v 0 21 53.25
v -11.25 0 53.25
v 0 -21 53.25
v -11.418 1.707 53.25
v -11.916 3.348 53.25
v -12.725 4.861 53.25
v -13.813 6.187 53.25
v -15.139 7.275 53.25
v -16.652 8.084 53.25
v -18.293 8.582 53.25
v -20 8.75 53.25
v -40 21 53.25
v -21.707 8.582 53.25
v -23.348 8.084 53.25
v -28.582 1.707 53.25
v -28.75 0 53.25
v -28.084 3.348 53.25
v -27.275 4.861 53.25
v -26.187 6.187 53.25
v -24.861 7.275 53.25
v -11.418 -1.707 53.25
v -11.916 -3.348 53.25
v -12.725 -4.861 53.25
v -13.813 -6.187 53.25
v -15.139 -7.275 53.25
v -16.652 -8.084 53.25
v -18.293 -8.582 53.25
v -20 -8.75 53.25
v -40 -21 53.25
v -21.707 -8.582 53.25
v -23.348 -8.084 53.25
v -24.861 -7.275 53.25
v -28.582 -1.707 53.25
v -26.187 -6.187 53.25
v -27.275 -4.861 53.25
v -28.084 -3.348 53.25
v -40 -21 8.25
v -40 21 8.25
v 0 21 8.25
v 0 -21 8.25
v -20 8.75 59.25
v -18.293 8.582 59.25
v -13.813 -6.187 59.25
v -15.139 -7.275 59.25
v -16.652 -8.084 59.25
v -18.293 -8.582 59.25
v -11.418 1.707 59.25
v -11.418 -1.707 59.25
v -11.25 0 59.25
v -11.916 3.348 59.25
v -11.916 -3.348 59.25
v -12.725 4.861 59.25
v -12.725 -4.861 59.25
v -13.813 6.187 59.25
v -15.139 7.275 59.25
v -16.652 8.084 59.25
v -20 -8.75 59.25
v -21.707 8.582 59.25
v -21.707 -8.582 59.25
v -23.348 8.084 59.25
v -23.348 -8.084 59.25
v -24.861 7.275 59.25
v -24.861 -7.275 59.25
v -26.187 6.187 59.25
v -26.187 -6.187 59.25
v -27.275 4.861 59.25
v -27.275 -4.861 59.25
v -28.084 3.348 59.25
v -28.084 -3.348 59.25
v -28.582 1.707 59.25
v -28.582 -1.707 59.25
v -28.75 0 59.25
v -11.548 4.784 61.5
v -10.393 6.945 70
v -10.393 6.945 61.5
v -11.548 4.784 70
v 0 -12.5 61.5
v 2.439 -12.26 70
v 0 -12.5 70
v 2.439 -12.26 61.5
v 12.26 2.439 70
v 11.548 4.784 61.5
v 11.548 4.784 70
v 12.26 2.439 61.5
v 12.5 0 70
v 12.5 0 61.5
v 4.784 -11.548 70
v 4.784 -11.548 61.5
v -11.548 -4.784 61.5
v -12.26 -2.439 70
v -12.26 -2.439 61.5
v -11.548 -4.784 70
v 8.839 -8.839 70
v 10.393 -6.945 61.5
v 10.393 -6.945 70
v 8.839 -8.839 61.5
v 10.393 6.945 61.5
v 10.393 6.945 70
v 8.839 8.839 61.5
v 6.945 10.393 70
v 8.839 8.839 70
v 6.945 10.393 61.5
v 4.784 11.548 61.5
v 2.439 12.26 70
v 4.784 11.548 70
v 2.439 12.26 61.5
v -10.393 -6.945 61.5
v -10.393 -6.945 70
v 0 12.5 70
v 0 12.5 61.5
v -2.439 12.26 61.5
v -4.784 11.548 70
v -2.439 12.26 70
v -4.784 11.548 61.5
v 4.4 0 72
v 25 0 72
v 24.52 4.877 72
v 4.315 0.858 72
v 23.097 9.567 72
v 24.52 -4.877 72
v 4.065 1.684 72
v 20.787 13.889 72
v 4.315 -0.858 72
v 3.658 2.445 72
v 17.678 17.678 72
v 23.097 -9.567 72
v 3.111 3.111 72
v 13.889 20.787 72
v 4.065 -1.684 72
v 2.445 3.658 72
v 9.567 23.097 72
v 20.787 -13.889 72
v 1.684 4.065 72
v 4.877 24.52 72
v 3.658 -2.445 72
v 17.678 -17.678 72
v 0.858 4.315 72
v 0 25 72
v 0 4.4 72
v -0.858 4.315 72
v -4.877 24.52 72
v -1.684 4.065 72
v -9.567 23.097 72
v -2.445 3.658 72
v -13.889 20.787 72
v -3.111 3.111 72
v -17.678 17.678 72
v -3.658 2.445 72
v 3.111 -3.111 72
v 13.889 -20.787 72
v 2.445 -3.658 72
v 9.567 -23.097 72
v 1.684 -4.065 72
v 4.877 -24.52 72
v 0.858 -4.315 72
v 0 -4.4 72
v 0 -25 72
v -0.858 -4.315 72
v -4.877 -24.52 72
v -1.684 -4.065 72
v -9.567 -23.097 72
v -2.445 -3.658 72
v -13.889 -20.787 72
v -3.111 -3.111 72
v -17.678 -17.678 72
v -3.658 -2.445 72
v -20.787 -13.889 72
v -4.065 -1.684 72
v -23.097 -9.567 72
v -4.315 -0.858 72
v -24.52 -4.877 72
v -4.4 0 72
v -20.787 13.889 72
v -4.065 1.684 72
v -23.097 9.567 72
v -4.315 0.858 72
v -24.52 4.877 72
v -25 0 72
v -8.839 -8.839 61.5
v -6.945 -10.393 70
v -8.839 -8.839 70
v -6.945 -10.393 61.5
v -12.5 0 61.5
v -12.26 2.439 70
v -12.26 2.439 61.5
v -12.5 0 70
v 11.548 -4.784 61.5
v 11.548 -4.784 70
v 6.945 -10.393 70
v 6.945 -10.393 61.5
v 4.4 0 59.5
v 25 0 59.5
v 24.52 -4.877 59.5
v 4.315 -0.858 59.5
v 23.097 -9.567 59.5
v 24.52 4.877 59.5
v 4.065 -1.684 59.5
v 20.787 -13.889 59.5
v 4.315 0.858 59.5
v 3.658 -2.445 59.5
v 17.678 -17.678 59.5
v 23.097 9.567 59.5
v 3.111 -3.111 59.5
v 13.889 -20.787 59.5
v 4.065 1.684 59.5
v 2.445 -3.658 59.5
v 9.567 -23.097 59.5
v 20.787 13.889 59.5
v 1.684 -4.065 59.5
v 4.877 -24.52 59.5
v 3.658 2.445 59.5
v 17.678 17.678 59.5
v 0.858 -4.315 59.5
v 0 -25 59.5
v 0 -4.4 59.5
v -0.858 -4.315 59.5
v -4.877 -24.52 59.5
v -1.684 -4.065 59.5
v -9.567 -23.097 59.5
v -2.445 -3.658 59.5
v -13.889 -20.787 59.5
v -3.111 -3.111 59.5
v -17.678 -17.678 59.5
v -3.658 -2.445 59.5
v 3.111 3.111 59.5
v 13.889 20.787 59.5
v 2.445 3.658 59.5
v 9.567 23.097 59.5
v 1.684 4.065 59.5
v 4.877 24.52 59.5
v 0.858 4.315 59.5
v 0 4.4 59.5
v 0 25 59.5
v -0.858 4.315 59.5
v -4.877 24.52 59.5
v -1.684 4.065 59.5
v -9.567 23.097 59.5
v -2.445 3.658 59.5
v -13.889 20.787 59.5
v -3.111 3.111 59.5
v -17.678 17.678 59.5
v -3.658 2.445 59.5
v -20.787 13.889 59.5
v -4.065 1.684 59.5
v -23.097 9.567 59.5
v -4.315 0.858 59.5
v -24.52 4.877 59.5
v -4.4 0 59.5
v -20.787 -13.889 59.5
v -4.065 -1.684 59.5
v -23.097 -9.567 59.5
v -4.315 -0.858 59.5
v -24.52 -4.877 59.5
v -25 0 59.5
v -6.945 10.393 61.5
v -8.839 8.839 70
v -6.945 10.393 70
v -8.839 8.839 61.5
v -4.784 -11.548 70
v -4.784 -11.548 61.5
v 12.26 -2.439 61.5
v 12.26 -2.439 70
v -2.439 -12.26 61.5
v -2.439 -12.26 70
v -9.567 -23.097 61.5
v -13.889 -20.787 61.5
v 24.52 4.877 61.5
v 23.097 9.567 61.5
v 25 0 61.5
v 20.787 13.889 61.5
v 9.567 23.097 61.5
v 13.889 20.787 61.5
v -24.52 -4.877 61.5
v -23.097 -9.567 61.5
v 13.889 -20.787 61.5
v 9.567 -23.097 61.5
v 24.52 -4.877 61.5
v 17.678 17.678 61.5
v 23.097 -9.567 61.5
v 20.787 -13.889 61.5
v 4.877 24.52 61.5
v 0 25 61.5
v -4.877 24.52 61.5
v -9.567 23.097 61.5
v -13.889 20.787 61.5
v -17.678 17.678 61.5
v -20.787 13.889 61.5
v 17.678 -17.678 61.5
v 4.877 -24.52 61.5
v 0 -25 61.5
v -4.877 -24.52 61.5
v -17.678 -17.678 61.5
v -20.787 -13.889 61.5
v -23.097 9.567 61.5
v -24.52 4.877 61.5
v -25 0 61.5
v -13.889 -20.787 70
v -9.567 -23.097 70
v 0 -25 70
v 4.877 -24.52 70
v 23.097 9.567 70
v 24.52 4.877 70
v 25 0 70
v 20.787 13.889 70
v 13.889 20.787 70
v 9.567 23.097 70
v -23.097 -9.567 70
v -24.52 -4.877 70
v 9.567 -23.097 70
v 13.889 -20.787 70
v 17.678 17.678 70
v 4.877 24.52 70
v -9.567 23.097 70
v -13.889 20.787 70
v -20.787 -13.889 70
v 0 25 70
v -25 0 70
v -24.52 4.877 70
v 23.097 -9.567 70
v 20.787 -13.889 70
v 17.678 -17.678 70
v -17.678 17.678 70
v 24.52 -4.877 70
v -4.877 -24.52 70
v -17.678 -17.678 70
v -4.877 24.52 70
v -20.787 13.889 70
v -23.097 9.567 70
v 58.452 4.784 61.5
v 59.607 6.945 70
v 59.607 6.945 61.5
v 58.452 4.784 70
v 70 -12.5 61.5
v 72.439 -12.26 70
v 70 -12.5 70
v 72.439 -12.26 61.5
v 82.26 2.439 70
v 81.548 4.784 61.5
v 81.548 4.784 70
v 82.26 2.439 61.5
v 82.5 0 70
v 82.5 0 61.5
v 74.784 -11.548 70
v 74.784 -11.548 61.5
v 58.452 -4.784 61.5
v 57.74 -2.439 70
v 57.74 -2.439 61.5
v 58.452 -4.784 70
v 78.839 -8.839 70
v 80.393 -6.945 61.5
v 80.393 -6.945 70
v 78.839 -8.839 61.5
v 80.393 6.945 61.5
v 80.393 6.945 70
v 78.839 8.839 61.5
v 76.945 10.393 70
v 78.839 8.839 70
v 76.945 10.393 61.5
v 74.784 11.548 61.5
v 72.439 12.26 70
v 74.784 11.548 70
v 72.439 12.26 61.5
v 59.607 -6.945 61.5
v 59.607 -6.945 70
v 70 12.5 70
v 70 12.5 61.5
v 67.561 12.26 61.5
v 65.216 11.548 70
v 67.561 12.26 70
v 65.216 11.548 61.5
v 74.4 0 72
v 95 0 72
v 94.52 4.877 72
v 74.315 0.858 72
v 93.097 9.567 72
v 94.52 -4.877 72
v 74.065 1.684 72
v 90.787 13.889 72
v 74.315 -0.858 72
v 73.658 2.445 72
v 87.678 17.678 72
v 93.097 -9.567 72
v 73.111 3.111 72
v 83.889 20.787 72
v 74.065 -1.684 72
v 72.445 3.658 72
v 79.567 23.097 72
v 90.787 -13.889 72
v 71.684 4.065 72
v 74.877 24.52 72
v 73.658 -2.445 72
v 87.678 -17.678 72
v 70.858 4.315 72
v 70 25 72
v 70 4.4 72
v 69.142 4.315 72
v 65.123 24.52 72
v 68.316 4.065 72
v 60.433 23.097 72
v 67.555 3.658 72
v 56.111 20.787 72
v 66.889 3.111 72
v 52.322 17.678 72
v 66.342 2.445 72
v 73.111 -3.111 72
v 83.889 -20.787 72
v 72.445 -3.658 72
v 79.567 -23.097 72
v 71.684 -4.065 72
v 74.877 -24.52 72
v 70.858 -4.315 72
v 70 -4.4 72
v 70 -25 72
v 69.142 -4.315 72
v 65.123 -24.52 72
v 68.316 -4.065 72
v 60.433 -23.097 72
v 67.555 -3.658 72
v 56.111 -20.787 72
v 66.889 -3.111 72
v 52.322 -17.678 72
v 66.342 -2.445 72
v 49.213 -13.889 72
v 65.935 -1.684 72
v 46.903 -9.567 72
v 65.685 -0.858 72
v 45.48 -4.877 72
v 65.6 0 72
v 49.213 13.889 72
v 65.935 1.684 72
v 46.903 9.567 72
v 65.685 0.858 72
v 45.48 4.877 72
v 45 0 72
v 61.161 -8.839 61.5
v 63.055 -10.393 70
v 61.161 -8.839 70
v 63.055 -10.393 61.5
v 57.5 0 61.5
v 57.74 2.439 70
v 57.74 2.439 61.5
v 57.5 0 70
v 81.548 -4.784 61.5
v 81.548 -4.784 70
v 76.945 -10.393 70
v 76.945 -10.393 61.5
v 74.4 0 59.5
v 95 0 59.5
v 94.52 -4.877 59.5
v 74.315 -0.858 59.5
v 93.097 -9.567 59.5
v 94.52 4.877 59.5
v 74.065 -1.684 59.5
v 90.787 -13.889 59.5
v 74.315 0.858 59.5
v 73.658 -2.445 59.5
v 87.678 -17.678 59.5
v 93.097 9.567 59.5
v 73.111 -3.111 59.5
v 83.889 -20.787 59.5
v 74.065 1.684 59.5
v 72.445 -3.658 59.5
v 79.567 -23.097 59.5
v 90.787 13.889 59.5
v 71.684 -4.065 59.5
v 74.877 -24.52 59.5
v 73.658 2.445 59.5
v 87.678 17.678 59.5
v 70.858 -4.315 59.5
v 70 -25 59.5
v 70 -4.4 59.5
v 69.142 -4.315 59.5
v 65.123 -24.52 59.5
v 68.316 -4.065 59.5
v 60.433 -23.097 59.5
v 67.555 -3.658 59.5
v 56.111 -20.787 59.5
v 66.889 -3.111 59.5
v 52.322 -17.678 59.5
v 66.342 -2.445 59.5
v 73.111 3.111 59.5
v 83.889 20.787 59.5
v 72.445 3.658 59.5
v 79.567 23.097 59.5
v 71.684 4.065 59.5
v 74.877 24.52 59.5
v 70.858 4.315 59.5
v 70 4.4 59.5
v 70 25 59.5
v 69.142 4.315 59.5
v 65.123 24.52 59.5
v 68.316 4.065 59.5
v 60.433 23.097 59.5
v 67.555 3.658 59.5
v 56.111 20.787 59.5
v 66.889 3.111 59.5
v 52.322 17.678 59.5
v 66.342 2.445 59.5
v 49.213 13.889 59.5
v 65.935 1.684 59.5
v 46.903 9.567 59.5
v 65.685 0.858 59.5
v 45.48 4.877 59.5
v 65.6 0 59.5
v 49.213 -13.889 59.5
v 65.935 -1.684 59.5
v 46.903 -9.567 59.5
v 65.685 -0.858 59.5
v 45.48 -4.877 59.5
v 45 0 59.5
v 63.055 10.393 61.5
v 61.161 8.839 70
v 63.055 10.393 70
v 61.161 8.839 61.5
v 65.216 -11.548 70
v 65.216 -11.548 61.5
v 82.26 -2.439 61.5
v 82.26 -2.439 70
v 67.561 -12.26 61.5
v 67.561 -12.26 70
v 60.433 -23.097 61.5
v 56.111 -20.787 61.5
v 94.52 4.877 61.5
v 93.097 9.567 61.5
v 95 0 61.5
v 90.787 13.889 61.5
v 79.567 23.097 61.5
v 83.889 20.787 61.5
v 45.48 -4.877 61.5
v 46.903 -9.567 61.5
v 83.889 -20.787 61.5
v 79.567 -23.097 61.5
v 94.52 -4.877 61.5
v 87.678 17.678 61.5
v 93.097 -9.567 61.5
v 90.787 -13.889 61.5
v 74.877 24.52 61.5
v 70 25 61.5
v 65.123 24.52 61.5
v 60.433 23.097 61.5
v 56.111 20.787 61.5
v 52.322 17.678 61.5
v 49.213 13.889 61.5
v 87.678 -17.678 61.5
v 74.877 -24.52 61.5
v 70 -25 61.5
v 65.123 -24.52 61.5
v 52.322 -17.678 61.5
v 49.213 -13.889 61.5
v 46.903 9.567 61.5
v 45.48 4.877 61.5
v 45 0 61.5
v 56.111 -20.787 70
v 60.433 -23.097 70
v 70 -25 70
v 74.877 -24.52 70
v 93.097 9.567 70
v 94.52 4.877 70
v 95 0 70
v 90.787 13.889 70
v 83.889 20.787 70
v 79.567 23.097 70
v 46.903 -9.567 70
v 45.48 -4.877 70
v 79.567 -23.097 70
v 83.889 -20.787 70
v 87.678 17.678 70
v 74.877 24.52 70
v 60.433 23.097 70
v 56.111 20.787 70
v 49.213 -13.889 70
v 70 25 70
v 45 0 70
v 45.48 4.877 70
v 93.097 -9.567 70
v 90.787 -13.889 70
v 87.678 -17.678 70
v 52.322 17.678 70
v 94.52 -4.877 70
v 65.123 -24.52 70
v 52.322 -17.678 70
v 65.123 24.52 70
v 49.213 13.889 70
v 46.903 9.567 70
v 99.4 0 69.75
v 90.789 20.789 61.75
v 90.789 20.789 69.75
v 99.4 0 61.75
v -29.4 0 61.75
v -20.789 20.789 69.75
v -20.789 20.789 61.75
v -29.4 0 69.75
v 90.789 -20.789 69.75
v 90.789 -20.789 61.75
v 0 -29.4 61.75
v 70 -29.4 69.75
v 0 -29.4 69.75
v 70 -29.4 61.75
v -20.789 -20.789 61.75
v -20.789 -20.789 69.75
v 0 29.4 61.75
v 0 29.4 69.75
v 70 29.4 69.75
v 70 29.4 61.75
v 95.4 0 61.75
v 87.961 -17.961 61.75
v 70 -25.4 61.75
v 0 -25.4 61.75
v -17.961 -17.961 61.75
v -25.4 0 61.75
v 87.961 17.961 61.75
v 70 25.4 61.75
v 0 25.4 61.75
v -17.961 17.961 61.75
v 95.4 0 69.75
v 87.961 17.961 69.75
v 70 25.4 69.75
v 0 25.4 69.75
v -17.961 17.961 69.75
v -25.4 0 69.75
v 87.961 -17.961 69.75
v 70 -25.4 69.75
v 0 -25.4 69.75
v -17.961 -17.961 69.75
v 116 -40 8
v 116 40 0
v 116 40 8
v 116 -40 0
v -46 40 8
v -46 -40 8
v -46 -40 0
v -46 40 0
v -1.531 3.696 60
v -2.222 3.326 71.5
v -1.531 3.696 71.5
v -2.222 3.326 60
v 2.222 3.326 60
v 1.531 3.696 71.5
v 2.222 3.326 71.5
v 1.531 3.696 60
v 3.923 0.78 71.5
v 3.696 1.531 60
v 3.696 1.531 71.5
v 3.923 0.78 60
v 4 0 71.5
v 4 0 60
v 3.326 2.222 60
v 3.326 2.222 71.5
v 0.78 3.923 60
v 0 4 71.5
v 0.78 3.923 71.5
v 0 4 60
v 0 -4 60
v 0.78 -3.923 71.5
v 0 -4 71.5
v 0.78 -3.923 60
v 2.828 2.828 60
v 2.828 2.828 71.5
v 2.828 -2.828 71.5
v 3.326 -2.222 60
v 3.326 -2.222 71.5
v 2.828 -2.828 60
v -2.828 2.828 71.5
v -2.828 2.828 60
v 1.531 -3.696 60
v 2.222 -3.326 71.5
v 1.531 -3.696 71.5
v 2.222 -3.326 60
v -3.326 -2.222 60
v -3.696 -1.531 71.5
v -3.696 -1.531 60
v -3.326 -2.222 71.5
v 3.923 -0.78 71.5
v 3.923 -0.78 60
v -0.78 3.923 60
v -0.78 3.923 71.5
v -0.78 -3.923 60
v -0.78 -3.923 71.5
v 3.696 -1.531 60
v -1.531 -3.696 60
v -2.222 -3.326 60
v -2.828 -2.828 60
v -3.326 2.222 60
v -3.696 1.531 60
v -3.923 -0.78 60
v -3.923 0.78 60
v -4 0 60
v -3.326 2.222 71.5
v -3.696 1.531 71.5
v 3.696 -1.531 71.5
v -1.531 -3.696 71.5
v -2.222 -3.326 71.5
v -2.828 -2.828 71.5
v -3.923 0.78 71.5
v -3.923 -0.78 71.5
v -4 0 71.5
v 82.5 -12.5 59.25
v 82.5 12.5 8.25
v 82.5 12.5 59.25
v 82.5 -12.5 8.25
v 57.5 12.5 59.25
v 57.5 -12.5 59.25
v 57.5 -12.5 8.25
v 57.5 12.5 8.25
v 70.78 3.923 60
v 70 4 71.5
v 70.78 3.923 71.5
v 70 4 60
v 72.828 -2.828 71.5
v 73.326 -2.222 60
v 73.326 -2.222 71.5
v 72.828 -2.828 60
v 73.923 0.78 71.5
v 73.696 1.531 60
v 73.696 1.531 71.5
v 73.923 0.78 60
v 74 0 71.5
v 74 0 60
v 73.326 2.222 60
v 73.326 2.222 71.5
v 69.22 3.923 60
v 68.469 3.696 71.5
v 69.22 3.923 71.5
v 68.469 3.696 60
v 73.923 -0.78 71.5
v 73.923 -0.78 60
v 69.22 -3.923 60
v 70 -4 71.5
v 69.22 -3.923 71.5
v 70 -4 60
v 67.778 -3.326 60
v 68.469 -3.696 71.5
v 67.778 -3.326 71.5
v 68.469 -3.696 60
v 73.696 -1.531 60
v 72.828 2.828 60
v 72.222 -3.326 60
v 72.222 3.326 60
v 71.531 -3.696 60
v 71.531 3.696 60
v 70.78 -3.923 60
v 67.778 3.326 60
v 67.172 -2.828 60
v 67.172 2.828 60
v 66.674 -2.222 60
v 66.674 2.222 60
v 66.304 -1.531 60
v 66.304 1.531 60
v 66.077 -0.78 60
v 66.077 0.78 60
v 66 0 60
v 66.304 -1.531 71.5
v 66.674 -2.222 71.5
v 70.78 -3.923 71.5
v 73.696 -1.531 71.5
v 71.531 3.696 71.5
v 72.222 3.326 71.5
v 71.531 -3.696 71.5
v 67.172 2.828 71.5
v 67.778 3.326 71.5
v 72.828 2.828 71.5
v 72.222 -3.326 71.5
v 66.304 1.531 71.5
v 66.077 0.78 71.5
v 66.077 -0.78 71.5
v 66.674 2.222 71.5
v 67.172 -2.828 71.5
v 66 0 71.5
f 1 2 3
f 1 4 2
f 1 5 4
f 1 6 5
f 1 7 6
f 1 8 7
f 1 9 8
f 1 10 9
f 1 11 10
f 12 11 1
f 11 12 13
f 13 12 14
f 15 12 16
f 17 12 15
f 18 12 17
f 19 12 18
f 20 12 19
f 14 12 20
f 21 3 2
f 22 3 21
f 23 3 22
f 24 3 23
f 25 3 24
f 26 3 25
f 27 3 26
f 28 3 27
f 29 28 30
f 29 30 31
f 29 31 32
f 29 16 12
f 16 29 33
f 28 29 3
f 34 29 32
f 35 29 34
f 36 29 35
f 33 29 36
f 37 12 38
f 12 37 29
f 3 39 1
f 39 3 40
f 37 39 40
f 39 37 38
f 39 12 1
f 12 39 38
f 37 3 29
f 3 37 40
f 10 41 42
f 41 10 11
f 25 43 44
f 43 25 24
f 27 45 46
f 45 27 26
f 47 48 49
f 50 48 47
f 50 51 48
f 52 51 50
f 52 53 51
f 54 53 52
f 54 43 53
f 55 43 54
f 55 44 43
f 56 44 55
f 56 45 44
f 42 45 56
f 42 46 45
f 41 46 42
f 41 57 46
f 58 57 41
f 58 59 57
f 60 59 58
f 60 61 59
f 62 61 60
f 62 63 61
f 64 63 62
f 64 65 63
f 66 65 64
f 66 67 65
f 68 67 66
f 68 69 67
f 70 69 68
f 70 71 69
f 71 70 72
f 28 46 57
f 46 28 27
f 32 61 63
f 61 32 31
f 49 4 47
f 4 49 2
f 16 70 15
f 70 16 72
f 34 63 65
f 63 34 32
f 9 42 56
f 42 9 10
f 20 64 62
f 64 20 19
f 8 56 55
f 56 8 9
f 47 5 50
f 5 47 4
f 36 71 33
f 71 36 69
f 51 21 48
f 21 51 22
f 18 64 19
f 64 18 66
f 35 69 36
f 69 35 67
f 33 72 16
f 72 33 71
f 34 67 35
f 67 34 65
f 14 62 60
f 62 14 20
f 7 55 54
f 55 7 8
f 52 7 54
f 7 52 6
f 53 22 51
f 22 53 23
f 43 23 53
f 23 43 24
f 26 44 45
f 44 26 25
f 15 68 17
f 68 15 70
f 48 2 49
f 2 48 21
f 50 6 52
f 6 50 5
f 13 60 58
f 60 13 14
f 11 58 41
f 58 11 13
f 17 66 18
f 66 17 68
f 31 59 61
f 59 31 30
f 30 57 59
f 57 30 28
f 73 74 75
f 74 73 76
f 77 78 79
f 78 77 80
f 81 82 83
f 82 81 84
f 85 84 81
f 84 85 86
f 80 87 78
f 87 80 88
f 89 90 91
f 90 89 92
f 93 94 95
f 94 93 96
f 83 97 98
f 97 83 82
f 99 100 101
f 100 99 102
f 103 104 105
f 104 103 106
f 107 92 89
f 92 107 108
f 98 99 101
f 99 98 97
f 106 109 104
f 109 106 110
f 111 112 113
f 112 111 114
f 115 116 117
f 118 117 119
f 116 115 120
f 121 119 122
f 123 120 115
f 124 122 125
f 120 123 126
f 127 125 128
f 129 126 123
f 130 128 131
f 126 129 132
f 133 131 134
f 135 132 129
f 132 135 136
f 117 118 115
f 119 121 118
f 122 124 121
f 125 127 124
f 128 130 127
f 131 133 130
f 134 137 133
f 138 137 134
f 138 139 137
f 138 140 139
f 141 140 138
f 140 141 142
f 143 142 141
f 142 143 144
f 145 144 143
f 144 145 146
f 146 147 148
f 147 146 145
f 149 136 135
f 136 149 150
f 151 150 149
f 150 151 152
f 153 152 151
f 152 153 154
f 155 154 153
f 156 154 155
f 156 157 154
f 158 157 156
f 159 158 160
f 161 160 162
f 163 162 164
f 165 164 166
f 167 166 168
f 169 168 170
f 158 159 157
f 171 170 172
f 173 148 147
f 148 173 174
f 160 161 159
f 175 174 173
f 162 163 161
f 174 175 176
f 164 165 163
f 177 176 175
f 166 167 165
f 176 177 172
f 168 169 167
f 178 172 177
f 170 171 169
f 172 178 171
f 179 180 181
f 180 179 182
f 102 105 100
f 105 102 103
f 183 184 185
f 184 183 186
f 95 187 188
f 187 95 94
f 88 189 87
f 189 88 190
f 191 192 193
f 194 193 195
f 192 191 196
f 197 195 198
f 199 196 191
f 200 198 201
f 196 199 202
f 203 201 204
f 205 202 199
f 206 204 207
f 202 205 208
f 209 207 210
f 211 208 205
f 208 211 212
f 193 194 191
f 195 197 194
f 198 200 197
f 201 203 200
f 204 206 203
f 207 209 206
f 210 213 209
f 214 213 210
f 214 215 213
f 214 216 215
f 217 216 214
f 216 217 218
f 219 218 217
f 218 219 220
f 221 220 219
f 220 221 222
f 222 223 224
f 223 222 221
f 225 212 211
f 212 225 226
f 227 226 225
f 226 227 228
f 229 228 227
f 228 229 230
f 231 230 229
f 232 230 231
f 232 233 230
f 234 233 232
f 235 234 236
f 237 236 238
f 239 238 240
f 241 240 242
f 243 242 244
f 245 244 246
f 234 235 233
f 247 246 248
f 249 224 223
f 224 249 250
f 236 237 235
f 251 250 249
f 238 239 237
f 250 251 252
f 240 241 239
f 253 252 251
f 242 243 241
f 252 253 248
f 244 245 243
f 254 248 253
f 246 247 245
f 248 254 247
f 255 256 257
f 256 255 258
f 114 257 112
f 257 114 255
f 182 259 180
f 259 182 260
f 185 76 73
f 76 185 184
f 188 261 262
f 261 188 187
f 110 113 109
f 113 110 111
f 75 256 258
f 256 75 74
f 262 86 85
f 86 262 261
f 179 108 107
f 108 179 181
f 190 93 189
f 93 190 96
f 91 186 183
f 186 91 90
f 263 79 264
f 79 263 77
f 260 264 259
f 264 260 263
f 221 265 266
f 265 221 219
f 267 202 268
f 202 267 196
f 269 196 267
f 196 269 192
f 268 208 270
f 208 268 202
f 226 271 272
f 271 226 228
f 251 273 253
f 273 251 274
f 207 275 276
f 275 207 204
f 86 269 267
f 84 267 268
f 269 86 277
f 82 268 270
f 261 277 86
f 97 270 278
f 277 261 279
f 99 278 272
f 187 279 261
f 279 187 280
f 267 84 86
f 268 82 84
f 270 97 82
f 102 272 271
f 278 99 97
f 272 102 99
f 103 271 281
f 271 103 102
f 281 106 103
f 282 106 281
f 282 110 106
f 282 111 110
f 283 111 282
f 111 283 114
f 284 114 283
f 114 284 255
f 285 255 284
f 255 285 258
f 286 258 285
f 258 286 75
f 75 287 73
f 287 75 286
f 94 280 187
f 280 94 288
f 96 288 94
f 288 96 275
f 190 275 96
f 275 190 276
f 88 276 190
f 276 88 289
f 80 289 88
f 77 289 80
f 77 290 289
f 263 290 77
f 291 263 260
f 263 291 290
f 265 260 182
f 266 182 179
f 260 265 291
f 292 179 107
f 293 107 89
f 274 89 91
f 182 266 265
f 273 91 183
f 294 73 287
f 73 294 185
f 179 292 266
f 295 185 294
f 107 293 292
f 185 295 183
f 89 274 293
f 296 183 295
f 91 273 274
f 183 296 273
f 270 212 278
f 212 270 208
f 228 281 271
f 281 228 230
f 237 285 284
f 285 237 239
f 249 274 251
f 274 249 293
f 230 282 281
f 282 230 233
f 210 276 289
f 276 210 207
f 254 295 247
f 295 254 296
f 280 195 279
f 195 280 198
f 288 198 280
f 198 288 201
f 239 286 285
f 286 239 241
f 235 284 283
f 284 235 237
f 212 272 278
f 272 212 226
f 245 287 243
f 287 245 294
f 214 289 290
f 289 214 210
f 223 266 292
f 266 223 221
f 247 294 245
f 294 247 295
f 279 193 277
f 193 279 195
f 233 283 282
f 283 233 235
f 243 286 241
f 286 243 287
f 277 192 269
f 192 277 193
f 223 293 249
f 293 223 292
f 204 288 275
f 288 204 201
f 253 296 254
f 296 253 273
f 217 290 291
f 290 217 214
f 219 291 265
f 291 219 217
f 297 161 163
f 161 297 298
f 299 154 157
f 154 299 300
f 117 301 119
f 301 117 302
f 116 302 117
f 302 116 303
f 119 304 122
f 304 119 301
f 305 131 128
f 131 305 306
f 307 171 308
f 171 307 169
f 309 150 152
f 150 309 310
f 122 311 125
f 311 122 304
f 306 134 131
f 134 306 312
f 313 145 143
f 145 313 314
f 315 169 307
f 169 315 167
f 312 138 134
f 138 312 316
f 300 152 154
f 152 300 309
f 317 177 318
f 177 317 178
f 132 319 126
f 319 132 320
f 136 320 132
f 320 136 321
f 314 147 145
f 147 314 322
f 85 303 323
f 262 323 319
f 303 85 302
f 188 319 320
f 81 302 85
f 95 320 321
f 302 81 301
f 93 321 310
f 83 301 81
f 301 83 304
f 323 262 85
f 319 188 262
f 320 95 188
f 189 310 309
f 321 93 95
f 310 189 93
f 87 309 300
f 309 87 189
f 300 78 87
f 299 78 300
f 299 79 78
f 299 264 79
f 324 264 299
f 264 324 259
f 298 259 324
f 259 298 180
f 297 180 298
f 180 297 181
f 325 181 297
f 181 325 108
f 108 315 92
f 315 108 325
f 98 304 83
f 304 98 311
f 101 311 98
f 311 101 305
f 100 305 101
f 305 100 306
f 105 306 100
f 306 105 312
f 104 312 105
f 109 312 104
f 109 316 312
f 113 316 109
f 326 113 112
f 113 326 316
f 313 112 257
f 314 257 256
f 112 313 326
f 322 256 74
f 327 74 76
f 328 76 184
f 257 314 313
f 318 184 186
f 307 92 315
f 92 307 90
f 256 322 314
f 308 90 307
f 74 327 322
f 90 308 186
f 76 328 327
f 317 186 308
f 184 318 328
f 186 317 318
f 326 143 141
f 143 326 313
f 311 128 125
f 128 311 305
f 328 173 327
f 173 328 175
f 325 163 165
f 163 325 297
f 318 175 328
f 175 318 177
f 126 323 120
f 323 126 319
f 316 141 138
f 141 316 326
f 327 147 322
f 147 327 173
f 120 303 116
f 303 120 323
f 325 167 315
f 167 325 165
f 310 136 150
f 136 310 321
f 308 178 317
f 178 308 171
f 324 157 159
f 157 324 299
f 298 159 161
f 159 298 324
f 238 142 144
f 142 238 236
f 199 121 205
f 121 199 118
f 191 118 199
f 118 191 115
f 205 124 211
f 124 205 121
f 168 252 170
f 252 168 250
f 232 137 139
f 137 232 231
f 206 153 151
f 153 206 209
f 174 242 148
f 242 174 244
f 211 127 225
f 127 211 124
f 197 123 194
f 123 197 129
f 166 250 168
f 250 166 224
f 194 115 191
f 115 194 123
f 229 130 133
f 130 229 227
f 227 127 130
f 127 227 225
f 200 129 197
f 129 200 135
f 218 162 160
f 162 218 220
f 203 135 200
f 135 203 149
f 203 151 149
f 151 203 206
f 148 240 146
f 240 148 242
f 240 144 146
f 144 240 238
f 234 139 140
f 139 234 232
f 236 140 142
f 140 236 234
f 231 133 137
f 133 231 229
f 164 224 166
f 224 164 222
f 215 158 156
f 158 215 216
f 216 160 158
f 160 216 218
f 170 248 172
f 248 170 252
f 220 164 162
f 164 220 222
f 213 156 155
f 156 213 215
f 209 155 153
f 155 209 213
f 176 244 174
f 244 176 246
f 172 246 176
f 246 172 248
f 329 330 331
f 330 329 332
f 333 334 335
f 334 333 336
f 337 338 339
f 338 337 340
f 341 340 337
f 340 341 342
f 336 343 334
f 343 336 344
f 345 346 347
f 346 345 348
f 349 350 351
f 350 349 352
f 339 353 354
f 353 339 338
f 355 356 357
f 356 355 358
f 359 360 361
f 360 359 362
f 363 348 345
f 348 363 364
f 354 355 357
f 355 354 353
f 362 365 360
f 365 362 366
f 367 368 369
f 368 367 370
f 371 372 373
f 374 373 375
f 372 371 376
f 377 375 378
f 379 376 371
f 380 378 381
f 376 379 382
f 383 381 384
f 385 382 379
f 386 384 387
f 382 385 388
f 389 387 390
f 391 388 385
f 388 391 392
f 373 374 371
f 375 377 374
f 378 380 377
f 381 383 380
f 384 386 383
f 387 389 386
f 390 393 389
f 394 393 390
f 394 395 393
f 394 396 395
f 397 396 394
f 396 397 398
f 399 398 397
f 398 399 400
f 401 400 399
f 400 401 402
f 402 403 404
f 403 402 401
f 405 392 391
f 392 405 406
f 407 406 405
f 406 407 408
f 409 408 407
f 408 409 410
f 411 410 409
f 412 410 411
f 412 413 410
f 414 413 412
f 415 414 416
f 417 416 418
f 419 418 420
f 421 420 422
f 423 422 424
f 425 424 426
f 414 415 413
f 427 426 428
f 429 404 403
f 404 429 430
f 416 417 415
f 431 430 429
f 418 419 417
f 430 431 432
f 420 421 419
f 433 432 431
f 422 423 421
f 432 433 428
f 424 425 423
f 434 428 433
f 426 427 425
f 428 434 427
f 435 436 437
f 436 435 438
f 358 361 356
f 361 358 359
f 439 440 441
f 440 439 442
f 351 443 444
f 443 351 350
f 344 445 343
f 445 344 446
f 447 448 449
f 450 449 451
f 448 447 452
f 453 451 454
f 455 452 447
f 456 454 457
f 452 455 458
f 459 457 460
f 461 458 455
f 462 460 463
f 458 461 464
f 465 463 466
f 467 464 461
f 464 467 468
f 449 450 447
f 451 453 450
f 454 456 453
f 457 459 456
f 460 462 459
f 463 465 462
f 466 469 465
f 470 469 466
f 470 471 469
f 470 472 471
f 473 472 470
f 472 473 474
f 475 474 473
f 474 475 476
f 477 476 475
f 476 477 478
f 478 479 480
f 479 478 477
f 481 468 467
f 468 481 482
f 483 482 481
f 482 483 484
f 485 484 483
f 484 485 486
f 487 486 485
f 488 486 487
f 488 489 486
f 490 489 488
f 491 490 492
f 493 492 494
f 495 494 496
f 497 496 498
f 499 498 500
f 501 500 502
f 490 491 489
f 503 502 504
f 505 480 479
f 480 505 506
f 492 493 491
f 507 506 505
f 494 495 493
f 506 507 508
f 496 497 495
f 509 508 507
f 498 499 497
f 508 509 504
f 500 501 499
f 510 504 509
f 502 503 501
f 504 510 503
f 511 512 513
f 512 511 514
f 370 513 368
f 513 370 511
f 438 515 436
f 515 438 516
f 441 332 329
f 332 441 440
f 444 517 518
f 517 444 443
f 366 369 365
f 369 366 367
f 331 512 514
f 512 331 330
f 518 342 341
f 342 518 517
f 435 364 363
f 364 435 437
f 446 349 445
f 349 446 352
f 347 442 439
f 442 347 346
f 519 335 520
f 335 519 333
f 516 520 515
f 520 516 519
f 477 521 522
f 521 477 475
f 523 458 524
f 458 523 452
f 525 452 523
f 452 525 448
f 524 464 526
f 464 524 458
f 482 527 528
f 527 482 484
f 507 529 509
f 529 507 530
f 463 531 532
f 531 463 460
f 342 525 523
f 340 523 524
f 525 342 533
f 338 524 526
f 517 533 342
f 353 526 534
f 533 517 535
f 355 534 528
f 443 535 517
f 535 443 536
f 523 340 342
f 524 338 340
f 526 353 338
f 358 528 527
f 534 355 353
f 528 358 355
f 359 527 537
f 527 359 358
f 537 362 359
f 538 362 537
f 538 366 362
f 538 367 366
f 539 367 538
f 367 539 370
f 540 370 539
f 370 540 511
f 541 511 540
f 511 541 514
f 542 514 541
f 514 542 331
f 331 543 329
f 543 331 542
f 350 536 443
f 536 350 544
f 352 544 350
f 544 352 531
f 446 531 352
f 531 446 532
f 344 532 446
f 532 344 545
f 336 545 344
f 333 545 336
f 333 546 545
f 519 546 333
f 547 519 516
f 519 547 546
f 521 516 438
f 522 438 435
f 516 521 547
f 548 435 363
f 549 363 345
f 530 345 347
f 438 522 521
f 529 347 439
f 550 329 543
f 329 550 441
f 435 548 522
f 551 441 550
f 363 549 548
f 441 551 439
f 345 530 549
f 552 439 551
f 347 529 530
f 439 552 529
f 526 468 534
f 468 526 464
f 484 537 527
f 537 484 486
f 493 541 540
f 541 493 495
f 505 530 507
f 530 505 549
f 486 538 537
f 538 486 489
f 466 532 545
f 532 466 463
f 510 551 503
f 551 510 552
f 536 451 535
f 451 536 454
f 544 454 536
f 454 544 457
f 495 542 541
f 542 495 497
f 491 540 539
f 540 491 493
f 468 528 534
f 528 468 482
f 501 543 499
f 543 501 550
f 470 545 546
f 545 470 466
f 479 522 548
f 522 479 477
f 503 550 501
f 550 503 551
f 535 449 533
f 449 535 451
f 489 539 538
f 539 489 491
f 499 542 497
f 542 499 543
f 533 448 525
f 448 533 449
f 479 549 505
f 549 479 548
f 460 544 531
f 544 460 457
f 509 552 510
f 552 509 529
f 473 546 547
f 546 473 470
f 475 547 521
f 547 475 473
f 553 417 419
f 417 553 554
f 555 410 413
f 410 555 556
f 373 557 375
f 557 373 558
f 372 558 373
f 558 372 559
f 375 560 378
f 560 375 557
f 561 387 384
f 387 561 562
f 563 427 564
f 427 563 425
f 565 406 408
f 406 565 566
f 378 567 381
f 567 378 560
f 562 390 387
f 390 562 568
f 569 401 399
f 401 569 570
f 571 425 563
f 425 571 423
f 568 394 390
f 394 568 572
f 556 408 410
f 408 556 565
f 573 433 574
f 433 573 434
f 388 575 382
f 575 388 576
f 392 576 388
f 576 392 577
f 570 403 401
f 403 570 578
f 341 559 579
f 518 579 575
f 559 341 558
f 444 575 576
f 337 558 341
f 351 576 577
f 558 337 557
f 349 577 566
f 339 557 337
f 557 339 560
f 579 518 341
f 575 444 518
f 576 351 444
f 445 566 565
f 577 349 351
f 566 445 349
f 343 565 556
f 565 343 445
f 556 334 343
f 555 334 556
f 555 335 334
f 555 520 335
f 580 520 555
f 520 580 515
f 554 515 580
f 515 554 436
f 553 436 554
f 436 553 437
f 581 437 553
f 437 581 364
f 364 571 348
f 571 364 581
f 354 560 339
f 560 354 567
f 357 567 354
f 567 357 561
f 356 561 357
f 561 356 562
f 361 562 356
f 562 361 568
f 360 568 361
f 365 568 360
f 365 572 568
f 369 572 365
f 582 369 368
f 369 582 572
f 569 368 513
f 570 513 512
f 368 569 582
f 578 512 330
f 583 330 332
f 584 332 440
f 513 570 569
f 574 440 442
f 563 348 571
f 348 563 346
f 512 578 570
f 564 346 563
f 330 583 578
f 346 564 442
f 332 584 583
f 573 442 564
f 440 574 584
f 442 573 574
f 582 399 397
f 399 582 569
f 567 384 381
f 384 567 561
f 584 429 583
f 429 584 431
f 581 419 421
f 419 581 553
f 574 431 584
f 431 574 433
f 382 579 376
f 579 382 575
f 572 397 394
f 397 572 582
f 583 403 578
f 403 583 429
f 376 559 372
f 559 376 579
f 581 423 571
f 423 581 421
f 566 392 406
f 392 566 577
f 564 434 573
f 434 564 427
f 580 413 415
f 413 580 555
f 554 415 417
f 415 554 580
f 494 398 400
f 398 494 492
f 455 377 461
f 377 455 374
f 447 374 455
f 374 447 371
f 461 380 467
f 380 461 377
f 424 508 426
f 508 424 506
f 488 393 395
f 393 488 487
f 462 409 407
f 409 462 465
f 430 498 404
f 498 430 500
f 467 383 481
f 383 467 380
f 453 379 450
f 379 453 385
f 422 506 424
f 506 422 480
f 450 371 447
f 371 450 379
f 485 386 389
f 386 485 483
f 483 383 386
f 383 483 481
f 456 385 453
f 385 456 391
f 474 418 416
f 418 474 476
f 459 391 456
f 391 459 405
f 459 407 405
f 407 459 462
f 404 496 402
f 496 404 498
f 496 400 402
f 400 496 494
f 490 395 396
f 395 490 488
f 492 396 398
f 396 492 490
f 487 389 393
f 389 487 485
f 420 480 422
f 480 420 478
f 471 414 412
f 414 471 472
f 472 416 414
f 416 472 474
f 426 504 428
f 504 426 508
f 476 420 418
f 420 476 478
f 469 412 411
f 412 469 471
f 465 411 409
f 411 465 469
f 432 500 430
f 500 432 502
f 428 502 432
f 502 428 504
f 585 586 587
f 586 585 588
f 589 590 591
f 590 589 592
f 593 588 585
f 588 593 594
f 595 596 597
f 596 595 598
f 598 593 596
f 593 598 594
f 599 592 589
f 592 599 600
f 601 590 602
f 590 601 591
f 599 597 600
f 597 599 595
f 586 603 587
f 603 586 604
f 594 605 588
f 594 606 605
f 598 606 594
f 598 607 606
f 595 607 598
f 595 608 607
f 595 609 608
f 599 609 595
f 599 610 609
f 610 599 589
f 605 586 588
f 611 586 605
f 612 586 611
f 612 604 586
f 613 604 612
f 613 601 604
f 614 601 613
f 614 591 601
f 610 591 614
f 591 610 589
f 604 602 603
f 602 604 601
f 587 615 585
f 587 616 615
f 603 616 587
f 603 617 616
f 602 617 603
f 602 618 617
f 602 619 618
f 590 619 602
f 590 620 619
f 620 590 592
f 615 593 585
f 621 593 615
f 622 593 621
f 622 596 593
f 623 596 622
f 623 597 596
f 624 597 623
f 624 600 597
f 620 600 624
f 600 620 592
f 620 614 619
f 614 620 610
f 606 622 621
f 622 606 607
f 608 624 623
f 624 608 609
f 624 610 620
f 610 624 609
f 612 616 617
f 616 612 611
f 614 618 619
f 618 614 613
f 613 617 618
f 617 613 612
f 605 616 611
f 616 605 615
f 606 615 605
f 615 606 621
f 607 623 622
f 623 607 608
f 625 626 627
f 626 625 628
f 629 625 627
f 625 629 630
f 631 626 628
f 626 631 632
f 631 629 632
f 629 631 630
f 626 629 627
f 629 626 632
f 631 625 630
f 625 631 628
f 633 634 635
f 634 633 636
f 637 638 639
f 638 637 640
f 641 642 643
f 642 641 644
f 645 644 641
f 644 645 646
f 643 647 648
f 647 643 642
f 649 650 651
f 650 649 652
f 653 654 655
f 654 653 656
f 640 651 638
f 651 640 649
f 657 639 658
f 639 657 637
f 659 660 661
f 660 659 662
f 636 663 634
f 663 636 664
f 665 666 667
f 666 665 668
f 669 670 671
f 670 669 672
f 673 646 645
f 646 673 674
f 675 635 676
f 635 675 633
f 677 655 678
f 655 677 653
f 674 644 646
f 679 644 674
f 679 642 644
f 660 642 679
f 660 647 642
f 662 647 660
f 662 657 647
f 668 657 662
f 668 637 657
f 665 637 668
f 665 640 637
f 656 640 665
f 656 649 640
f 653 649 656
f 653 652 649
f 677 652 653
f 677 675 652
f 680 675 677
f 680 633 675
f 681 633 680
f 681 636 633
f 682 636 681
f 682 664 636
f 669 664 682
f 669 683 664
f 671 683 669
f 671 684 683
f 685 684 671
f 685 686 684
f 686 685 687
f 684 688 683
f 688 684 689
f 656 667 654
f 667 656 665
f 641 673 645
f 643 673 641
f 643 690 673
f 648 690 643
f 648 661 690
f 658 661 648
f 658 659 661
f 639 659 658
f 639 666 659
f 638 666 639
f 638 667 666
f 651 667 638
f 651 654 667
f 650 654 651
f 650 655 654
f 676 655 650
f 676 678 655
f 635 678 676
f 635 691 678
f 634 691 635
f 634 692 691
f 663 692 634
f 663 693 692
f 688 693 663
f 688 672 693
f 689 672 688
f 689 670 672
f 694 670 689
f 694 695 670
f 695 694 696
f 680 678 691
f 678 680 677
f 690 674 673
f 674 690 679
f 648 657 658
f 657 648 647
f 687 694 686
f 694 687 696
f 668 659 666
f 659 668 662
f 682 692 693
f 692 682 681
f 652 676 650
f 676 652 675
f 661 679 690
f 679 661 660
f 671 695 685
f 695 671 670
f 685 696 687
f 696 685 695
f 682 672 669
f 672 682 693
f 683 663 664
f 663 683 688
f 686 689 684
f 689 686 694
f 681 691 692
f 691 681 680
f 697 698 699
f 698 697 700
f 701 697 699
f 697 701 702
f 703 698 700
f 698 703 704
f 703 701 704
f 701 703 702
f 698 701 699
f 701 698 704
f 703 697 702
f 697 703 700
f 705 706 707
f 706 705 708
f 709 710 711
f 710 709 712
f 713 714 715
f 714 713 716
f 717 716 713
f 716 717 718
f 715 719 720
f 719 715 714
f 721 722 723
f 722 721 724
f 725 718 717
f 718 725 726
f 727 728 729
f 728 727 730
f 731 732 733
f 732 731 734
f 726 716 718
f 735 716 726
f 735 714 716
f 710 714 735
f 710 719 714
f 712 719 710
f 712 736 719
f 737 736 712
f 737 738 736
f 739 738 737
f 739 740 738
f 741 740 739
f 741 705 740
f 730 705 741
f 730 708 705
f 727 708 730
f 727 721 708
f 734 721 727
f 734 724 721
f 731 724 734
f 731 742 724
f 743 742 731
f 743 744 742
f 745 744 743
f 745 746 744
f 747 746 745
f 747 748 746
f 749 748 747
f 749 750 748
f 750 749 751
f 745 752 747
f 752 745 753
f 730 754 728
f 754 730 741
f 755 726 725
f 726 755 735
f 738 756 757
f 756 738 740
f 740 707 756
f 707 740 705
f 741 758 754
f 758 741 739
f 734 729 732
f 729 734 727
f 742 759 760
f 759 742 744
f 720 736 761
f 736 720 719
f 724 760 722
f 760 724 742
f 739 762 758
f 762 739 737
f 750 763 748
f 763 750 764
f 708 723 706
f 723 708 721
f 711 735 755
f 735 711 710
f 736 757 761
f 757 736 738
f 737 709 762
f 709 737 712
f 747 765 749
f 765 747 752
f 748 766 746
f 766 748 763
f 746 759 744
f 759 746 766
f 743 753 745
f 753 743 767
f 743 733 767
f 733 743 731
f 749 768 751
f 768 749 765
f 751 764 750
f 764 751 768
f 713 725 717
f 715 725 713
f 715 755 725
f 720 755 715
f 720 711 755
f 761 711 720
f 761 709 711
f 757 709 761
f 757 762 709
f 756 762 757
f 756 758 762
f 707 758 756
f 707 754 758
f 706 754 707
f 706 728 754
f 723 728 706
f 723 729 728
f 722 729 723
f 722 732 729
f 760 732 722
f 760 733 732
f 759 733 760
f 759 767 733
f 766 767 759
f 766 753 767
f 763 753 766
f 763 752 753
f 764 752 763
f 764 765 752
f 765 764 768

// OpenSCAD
$fn = 32;

// ------------------------------------------------------------------------
// Motor belt drive: span 70 mm, pulleys d50, belt 8 mm wide
// Every part is its own module, assembly() places every instance.
// ------------------------------------------------------------------------

// --- part 1 ---
module base_plate() {
  difference() {
    translate([-81, -40, 0]) cube([162, 80, 8]);
  }
}

// --- part 2 ---
module motor() {
  union() {
    translate([-22.5, -21, 0]) cube([45, 42, 40]);
    translate([25.5, 0, 20]) rotate([0, 90, 0]) cylinder(h = 6, d = 17.5, center = true);
  }
}

// --- part 3 ---
module drive_shaft() {
  translate([0, 0, -5.75]) cylinder(h = 11.5, d = 8);
}

// --- part 4 ---
module pulley_drive() {
  difference() {
    union() {
      cylinder(h = 12.5, d = 25);
      cylinder(h = 2, d = 50);
      translate([0, 0, 10.5]) cylinder(h = 2, d = 50);
    }
    translate([0, 0, -1]) cylinder(h = 14.5, d = 8.8);
  }
}

// --- part 5 ---
module idler_post() {
  translate([-12.5, -12.5, 0]) cube([25, 25, 51]);
}

// --- part 6 ---
module driven_shaft() {
  translate([0, 0, -5.75]) cylinder(h = 11.5, d = 8);
}

// --- part 7 ---
module pulley_driven() {
  difference() {
    union() {
      cylinder(h = 12.5, d = 25);
      cylinder(h = 2, d = 50);
      translate([0, 0, 10.5]) cylinder(h = 2, d = 50);
    }
    translate([0, 0, -1]) cylinder(h = 14.5, d = 8.8);
  }
}

// --- part 8 ---
module drive_belt() {
  difference() {
    linear_extrude(height = 8) polygon(points = concat([for (a = [90 : 45 : 270]) [29.4 * cos(a), 29.4 * sin(a)]], [for (a = [270 : 45 : 450]) [70 + 29.4 * cos(a), 29.4 * sin(a)]]));
    translate([0, 0, -1]) linear_extrude(height = 10) polygon(points = concat([for (a = [90 : 45 : 270]) [25.4 * cos(a), 25.4 * sin(a)]], [for (a = [270 : 45 : 450]) [70 + 25.4 * cos(a), 25.4 * sin(a)]]));
  }
}

// --- assembly ---
module assembly() {
  color([0.80, 0.24, 0.20]) translate([35, 0, 0]) rotate([0, 0, 0]) base_plate();
  color([0.20, 0.45, 0.75]) translate([0, 0, 30.75]) rotate([0, 270, 0]) motor();
  color([0.25, 0.62, 0.32]) translate([0, 0, 65.75]) rotate([0, 0, 0]) drive_shaft();
  color([0.92, 0.70, 0.18]) translate([0, 0, 59.5]) rotate([0, 0, 0]) pulley_drive();
  color([0.58, 0.35, 0.70]) translate([70, 0, 8.25]) rotate([0, 0, 0]) idler_post();
  color([0.16, 0.66, 0.66]) translate([70, 0, 65.75]) rotate([0, 0, 0]) driven_shaft();
  color([0.85, 0.48, 0.18]) translate([70, 0, 59.5]) rotate([0, 0, 0]) pulley_driven();
  color([0.55, 0.60, 0.65]) translate([0, 0, 61.75]) rotate([0, 0, 0]) drive_belt();
}

assembly();
